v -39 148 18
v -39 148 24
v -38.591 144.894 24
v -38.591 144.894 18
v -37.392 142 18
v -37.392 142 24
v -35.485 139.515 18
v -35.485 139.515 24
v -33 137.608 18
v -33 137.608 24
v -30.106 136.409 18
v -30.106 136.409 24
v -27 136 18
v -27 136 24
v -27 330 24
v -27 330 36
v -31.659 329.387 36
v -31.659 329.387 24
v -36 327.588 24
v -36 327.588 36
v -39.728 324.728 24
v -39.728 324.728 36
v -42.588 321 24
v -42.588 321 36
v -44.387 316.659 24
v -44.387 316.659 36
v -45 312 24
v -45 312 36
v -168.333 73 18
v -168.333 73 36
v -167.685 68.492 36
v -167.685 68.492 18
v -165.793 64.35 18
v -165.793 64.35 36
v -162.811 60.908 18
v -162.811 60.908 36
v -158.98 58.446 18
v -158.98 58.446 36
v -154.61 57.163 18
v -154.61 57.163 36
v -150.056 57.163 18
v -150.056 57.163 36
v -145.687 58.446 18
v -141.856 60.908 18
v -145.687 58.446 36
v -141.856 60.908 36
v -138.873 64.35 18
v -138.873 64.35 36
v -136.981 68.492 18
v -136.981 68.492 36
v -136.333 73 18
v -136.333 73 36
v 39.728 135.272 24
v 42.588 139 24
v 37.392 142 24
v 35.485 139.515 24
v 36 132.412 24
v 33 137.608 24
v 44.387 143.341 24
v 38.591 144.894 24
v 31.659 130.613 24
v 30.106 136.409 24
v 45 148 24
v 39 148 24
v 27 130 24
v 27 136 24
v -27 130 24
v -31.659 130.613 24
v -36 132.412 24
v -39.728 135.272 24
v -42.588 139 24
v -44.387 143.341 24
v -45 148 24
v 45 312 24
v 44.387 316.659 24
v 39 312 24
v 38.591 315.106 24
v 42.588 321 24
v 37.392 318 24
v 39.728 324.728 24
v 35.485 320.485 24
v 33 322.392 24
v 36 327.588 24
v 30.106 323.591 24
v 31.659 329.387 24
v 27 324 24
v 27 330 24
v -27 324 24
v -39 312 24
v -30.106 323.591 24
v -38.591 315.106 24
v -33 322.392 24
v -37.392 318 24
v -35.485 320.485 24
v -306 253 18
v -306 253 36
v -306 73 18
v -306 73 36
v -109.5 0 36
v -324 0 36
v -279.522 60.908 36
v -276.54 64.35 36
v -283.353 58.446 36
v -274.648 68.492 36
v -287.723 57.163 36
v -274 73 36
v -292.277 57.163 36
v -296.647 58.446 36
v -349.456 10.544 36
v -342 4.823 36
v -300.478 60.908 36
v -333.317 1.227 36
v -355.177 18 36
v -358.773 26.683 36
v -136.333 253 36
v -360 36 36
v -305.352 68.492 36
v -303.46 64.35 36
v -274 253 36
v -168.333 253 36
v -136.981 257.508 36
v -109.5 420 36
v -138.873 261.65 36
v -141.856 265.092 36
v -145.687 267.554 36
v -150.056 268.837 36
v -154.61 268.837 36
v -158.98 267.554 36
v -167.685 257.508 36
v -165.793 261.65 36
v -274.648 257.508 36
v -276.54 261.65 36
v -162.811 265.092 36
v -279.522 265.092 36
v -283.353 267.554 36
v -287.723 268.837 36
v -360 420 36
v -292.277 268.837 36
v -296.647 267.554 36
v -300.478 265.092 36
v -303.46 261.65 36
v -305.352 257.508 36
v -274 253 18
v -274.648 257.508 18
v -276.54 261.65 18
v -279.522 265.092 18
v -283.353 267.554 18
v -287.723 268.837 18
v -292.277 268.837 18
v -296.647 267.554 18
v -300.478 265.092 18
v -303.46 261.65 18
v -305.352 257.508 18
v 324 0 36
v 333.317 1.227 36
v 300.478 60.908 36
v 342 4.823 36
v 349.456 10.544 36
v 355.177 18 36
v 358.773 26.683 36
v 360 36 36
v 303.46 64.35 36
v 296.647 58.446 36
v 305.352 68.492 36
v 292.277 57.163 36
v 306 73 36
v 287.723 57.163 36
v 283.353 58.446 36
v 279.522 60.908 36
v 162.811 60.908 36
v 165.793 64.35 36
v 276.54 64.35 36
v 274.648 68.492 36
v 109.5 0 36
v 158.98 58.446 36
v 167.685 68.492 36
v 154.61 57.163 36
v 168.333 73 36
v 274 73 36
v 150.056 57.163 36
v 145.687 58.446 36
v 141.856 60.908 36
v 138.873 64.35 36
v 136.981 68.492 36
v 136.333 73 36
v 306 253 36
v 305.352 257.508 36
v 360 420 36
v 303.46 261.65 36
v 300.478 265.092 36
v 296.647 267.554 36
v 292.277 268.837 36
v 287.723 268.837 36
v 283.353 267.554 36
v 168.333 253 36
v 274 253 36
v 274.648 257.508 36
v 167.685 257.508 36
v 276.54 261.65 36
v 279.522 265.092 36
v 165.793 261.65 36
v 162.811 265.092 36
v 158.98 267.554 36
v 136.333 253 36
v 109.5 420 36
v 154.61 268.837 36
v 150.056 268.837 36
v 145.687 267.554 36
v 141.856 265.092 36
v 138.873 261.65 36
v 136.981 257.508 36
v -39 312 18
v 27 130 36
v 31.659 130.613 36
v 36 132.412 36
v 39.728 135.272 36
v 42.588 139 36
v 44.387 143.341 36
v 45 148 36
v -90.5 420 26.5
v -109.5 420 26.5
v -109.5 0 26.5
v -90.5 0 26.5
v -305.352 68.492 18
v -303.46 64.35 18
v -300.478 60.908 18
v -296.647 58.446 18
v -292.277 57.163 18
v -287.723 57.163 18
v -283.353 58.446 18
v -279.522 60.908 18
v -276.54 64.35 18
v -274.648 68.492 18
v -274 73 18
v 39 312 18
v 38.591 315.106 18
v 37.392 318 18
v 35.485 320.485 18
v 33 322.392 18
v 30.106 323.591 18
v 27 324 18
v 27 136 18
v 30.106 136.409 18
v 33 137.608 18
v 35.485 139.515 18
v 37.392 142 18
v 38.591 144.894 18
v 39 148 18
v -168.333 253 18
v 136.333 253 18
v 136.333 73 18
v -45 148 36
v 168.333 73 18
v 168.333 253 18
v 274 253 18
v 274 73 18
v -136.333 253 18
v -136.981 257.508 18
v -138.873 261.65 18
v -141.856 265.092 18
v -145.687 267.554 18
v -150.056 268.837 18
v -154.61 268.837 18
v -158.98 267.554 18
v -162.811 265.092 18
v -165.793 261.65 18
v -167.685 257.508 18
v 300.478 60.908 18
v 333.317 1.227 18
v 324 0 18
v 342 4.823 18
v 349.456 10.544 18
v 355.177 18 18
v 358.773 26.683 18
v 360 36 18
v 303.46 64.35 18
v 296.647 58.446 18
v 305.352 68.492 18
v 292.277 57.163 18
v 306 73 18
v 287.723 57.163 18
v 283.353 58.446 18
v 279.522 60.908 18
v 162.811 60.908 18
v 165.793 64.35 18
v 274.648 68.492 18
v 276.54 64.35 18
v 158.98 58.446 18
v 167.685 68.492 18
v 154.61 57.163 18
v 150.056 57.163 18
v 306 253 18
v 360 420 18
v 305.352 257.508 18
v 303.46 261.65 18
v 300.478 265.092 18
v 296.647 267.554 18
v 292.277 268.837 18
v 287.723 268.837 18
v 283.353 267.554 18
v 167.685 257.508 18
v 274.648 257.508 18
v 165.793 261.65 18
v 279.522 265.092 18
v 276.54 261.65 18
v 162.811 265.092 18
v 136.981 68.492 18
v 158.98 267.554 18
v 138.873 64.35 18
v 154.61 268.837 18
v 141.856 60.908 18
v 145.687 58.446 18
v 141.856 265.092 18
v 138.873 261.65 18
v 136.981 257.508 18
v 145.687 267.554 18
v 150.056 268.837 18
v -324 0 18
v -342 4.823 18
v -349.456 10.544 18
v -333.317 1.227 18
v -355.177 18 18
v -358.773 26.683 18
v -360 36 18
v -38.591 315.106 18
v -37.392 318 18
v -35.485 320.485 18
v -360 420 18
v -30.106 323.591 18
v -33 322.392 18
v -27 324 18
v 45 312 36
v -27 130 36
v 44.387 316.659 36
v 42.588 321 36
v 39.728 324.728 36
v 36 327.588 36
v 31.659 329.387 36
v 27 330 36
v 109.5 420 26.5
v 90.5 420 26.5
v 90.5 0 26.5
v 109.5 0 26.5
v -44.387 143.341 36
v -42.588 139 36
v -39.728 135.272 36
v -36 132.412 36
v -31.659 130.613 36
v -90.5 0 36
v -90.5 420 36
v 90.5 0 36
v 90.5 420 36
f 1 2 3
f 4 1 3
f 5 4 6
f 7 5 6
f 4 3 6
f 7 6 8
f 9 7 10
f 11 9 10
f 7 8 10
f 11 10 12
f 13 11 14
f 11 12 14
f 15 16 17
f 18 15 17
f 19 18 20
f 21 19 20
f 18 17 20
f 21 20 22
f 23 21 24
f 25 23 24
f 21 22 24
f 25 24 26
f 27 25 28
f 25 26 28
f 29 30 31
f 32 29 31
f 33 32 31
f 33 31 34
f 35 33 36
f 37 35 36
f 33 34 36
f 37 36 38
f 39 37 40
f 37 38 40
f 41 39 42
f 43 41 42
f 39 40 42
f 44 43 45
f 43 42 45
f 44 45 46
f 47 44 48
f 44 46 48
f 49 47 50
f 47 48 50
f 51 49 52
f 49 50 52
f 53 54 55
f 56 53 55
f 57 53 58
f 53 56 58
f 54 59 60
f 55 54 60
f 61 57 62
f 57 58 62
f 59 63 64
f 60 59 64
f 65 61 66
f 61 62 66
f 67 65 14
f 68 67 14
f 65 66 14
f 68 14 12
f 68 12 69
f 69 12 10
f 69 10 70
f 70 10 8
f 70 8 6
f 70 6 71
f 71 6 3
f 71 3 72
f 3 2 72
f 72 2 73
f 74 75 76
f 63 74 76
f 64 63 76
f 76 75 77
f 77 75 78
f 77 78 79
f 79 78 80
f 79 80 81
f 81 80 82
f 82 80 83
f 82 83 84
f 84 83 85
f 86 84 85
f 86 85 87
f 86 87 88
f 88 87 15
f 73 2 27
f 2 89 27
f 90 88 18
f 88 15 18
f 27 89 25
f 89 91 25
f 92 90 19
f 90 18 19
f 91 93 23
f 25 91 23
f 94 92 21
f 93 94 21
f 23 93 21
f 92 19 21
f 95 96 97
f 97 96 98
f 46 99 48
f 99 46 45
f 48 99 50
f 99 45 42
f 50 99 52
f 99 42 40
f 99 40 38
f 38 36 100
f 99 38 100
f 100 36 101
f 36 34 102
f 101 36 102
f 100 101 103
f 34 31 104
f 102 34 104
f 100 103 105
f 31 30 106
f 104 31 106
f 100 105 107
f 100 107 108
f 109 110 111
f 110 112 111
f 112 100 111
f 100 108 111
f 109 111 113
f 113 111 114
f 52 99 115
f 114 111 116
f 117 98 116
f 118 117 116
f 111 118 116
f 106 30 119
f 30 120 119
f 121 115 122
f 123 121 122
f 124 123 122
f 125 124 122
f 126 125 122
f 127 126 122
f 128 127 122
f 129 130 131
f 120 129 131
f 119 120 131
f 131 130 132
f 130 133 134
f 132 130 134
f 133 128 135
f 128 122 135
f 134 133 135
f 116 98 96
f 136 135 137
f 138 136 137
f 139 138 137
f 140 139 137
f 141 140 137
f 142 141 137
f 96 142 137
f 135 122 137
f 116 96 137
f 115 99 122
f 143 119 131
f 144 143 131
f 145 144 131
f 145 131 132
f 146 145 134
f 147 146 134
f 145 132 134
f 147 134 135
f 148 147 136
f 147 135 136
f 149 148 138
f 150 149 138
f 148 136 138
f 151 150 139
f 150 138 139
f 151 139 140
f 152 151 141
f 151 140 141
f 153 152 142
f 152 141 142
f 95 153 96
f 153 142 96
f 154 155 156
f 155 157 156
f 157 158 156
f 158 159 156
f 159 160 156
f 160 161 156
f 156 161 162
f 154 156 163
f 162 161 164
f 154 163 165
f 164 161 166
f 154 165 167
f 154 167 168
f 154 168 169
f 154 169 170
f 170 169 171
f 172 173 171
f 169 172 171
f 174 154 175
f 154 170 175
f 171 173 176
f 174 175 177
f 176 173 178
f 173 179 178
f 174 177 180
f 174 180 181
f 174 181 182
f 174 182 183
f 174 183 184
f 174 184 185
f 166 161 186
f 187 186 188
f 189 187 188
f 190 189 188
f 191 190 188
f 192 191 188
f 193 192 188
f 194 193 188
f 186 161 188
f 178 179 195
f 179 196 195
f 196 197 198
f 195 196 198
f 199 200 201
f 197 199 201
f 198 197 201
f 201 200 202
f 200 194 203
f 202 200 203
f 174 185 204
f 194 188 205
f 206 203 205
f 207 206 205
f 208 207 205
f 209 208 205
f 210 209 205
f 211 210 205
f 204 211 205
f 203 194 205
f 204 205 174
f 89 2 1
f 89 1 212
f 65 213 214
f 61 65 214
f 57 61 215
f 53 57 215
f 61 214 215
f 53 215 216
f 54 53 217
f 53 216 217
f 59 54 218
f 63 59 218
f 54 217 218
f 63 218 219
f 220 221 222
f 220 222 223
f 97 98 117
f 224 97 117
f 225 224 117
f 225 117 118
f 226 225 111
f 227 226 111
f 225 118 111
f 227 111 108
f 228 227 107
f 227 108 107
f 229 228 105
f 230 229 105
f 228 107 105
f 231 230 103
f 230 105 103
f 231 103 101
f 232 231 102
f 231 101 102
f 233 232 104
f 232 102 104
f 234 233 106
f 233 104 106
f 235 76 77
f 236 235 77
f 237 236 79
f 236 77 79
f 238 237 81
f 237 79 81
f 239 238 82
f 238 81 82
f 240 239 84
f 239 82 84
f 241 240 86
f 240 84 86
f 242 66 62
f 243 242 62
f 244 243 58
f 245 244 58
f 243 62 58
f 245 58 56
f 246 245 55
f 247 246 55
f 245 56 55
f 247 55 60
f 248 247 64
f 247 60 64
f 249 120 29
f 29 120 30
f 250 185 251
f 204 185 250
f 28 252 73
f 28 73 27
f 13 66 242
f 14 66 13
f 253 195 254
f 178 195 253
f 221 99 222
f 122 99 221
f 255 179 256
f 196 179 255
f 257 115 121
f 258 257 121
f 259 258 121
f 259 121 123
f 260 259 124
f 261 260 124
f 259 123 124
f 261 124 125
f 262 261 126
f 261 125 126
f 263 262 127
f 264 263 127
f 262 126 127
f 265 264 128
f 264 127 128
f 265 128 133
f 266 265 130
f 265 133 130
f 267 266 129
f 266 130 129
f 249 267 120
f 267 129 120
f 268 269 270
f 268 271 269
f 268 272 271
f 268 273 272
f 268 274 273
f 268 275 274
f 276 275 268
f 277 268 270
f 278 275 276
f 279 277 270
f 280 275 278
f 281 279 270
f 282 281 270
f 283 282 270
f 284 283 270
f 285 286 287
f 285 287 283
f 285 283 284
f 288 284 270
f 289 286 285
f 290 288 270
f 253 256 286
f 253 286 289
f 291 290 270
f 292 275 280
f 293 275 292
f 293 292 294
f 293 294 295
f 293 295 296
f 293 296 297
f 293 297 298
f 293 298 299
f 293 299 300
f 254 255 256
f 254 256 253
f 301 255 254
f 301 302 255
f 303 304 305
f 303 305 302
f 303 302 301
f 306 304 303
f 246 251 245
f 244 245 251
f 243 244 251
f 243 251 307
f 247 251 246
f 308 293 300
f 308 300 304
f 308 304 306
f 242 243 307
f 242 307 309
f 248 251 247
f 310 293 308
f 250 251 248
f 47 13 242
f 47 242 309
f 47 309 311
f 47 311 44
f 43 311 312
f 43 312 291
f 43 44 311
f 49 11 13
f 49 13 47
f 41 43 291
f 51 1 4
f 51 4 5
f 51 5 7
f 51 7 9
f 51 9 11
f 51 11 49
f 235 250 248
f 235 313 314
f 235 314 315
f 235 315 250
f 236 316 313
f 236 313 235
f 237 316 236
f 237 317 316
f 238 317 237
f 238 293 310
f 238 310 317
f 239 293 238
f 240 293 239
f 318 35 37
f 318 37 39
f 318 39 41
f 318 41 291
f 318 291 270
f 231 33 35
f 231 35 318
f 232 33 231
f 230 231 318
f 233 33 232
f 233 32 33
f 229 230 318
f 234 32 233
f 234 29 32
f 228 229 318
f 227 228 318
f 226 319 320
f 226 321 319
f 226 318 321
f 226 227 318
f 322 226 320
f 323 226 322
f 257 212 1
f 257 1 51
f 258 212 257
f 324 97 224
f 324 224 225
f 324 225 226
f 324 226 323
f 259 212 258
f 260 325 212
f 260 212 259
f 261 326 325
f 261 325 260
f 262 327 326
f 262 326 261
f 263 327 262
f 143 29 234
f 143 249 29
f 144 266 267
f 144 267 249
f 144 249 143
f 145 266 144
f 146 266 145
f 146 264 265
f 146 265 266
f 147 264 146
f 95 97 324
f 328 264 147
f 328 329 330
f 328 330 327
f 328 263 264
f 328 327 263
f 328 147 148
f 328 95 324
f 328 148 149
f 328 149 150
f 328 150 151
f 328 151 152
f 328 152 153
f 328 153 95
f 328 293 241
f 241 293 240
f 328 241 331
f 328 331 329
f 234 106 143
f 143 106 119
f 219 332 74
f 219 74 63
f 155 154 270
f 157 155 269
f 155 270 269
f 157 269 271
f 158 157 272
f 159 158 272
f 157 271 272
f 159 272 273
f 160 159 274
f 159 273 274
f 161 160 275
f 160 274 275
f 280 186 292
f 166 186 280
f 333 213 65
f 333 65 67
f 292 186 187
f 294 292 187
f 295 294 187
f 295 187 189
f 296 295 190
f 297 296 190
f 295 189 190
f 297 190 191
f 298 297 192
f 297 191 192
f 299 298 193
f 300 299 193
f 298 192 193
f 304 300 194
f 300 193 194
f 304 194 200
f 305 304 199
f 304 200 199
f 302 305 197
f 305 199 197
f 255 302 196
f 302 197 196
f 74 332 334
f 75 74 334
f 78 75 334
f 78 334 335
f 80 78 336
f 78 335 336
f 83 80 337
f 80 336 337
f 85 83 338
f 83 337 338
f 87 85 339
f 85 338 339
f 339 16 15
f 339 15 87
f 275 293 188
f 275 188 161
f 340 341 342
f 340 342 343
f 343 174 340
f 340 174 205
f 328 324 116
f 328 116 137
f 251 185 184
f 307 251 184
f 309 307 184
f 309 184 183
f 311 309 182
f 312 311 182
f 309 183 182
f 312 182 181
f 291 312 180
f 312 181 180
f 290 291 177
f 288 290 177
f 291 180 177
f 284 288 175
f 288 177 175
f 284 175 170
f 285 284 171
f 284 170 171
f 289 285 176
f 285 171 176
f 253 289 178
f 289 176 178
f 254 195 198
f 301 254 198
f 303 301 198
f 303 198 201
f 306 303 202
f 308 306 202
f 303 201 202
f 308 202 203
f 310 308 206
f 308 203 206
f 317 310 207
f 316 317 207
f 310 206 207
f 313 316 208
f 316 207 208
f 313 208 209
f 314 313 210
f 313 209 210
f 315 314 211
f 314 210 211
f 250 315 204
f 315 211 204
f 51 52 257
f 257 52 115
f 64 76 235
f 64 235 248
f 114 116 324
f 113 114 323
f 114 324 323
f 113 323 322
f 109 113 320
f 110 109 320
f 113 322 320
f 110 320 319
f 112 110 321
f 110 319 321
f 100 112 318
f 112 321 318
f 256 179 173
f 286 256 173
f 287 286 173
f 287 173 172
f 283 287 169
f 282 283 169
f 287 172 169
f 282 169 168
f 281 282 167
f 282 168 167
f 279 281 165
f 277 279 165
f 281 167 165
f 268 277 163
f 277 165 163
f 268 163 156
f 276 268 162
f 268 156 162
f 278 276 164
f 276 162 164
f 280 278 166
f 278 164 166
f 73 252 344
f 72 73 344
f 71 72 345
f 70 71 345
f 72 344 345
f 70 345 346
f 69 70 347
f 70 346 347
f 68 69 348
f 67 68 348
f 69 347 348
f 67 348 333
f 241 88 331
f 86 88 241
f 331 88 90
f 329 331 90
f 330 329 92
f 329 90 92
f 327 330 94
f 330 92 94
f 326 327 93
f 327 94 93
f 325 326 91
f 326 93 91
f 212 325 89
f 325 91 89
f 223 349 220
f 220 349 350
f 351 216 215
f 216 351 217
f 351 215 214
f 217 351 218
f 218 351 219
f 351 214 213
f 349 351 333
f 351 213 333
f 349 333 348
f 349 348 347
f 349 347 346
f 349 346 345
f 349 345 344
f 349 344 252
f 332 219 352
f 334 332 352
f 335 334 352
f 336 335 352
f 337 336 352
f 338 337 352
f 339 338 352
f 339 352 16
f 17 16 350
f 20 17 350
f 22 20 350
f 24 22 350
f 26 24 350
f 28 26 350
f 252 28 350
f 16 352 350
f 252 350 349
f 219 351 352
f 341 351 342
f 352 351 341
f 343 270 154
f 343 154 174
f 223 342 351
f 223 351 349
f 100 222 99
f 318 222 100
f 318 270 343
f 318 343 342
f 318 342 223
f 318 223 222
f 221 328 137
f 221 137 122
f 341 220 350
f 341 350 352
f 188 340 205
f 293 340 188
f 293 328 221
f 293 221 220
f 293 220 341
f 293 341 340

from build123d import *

# Parameters (mm, degrees)
PAD001_DEPTH    = 18
POCKET001_DEPTH = 18
SKETCH004_W     = 19
SKETCH004_H     = 420
POCKET002_DEPTH = 9.5
POCKET004_DEPTH = 12


with BuildPart() as part:
    # Sketch002 → Pad001 (new body)
    with BuildSketch(Plane.XY):
        with BuildLine():
            Line((-360, 420), (360, 420))
            Line((360, 420), (360, 36))
            ThreePointArc((324, 0), (349.455844, 10.544156), (360, 36))
            Line((324, 0), (-324, 0))
            ThreePointArc((-360, 36), (-349.455844, 10.544156), (-324, 0))
            Line((-360, 36), (-360, 420))
        make_face()
    extrude(amount=PAD001_DEPTH)

    # Sketch003 → Pocket001 (cut)
    with BuildSketch(Plane.XY.offset(18)):
        with BuildLine():
            ThreePointArc((-274, 253), (-290, 269), (-306, 253))
            Line((-306, 253), (-306, 73))
            ThreePointArc((-306, 73), (-290, 57), (-274, 73))
            Line((-274, 73), (-274, 253))
        make_face()
        with BuildLine():
            ThreePointArc((-136.333333, 253), (-152.333333, 269), (-168.333333, 253))
            Line((-168.333333, 253), (-168.333333, 73))
            ThreePointArc((-168.333333, 73), (-152.333333, 57), (-136.333333, 73))
            Line((-136.333333, 73), (-136.333333, 253))
        make_face()
        with BuildLine():
            ThreePointArc((306, 253), (290, 269), (274, 253))
            Line((274, 73), (274, 253))
            ThreePointArc((274, 73), (290, 57), (306, 73))
            Line((306, 253), (306, 73))
        make_face()
        with BuildLine():
            ThreePointArc((168.333333, 253), (152.333333, 269), (136.333333, 253))
            Line((136.333333, 73), (136.333333, 253))
            ThreePointArc((136.333333, 73), (152.333333, 57), (168.333333, 73))
            Line((168.333333, 253), (168.333333, 73))
        make_face()
        with BuildLine():
            Line((-27, 324), (27, 324))
            ThreePointArc((39, 312), (35.485281, 320.485281), (27, 324))
            Line((39, 312), (39, 148))
            ThreePointArc((27, 136), (35.485281, 139.514719), (39, 148))
            Line((27, 136), (-27, 136))
            ThreePointArc((-39, 148), (-35.485281, 139.514719), (-27, 136))
            Line((-39, 148), (-39, 312))
            ThreePointArc((-27, 324), (-35.485281, 320.485281), (-39, 312))
        make_face()
    extrude(amount=-POCKET001_DEPTH, mode=Mode.SUBTRACT)

    # Sketch004 → Pocket002 (cut)
    with BuildSketch(Plane.XY.offset(18)):
        with Locations((-100, 210)):
            Rectangle(SKETCH004_W, SKETCH004_H)
        with Locations((100, 210)):
            Rectangle(SKETCH004_W, SKETCH004_H)
    extrude(amount=-POCKET002_DEPTH, mode=Mode.SUBTRACT)

    # Sketch007 → Pocket004 (cut)
    with BuildSketch(Plane.XY.offset(18)):
        with BuildLine():
            Line((-27, 330), (27, 330))
            ThreePointArc((45, 312), (39.727922, 324.727922), (27, 330))
            Line((45, 312), (45, 148))
            ThreePointArc((27, 130), (39.727922, 135.272078), (45, 148))
            Line((27, 130), (-27, 130))
            ThreePointArc((-45, 148), (-39.727922, 135.272078), (-27, 130))
            Line((-45, 148), (-45, 312))
            ThreePointArc((-27, 330), (-39.727922, 324.727922), (-45, 312))
        make_face()
    extrude(amount=-POCKET004_DEPTH, mode=Mode.SUBTRACT)


with BuildPart() as part_1:
    # Body001 placement: moved
    add(part.part.moved(Location((0, 0, 18))))


solid = part_1.part
